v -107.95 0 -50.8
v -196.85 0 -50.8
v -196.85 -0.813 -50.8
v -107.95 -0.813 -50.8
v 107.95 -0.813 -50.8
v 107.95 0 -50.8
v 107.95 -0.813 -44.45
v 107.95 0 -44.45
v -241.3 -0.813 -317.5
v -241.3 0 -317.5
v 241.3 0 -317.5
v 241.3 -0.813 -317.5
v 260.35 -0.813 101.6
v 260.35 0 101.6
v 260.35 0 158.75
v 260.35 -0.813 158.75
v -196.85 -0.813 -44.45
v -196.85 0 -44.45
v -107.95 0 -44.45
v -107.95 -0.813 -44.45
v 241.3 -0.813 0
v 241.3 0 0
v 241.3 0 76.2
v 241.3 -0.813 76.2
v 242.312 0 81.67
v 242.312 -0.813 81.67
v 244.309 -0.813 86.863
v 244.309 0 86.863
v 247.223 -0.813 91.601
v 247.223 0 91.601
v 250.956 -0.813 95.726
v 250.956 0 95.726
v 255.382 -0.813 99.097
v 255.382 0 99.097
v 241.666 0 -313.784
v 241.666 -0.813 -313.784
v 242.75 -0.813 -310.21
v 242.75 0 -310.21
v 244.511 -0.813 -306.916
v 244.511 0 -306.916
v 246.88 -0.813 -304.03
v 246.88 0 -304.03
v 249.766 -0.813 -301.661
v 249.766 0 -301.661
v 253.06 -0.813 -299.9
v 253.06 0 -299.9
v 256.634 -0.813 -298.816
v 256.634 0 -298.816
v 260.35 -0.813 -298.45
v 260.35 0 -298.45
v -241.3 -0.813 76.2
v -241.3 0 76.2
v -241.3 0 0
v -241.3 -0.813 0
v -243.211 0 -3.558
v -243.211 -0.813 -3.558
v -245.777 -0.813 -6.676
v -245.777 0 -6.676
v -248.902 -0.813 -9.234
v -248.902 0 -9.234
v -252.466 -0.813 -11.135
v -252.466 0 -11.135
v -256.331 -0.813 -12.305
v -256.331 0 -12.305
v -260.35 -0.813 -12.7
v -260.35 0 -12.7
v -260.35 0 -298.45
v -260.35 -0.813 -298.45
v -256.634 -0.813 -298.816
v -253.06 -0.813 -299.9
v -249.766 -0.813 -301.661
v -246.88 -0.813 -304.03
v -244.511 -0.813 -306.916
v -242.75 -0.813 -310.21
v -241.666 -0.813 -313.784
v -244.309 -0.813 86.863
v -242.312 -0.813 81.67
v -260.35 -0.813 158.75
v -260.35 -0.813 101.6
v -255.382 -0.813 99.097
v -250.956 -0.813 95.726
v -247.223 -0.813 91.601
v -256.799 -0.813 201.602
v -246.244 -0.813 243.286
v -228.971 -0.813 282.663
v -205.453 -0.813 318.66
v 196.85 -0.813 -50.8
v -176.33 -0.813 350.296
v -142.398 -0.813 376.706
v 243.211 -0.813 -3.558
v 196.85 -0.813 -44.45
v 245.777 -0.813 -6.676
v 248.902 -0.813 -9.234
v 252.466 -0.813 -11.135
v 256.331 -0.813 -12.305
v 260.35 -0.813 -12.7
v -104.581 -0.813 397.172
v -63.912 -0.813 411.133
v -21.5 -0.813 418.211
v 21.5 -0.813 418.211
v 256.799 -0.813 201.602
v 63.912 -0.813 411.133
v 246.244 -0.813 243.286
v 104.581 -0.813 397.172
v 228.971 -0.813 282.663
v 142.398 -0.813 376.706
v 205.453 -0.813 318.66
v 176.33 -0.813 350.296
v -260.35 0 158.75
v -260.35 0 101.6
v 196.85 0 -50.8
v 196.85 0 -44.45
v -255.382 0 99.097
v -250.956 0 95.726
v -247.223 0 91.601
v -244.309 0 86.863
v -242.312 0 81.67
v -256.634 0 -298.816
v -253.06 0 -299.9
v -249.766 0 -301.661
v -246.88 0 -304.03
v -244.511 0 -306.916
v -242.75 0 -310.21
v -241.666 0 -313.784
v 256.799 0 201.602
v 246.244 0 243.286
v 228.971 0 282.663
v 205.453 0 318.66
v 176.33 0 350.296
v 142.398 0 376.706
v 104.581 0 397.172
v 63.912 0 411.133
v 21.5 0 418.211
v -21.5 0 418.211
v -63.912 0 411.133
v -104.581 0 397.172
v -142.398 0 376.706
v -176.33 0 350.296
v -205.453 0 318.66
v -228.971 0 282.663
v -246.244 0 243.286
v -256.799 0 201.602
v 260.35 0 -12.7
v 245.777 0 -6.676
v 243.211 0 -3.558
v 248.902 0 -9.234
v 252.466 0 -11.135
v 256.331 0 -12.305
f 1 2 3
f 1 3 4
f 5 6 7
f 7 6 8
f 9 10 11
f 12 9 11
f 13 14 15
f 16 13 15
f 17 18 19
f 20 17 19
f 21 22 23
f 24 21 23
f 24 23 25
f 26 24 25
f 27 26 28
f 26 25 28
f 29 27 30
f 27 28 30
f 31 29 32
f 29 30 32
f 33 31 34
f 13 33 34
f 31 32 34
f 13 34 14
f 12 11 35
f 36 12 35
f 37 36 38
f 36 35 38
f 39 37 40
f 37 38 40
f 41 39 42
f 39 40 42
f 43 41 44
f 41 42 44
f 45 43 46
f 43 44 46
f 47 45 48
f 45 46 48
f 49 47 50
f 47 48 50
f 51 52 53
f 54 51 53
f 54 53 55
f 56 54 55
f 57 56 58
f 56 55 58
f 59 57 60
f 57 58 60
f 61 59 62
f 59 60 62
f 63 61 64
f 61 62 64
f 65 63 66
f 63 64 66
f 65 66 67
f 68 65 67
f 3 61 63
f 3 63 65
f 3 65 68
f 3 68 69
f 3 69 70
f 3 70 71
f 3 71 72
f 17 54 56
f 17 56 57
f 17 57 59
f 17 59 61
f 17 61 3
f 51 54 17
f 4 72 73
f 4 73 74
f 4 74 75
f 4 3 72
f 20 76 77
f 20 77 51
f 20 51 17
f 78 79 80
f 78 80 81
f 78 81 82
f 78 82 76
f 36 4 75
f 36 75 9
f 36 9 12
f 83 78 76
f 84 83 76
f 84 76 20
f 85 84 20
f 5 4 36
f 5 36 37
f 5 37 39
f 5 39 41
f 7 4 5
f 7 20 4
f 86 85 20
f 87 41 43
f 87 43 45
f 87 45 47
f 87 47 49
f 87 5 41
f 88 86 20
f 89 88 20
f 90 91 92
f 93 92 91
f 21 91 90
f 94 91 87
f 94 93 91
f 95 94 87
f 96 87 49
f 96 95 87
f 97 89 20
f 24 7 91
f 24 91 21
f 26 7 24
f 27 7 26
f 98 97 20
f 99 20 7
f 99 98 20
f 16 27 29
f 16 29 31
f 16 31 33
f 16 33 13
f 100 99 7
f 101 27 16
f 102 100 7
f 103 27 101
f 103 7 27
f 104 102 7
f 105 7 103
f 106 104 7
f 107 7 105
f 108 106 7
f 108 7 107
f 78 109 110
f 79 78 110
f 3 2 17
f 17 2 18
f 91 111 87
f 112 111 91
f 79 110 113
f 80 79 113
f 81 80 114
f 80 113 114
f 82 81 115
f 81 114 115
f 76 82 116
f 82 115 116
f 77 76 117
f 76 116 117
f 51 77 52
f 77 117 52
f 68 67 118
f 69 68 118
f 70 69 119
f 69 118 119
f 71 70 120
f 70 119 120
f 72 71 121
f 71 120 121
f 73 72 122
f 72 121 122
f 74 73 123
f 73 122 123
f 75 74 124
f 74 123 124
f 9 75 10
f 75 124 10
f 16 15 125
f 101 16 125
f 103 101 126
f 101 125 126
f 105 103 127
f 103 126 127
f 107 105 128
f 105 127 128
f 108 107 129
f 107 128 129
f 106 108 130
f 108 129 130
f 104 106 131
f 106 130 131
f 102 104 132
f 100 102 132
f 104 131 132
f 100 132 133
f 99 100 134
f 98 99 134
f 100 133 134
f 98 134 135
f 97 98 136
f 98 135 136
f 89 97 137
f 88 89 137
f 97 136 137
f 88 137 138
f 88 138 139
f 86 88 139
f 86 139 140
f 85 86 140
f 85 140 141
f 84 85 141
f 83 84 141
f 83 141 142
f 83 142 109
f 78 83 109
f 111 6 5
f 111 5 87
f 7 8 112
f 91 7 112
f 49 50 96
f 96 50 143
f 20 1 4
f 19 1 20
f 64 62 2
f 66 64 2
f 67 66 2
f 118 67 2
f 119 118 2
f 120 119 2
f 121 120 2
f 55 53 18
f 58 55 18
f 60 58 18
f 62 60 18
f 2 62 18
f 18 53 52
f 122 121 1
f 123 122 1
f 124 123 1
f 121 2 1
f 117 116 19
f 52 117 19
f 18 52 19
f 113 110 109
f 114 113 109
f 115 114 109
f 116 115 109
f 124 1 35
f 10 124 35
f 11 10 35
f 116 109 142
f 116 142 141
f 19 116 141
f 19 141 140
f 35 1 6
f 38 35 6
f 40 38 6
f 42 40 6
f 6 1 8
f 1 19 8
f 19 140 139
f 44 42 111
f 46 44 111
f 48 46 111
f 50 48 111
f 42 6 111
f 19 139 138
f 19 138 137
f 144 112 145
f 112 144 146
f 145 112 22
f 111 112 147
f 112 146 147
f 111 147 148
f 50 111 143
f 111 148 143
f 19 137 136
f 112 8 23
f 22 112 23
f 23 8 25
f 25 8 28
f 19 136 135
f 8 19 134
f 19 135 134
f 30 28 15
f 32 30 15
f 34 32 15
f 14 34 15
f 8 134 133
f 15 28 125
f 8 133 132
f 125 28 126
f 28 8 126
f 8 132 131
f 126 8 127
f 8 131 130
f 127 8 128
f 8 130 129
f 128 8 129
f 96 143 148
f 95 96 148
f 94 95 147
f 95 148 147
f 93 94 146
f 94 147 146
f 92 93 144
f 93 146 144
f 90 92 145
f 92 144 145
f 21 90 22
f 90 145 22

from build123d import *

# Parameters (mm, degrees)
F0_W     = 88.9
F0_H     = 6.35
F1_DEPTH = 0.8128


with BuildPart() as f1:
    # F0 (on Front) → F1 (new body)
    with BuildSketch(Plane.XZ):
        with BuildLine():
            ThreePointArc((-241.3, 0), (-248.902375, -9.233938), (-260.35, -12.7))
            Line((-260.35, -12.7), (-260.35, -298.45))
            ThreePointArc((-260.35, -298.45), (-246.879616, -304.029616), (-241.3, -317.5))
            Line((-241.3, -317.5), (241.3, -317.5))
            ThreePointArc((241.3, -317.5), (246.879616, -304.029616), (260.35, -298.45))
            Line((260.35, -298.45), (260.35, -12.7))
            ThreePointArc((260.35, -12.7), (248.902375, -9.233938), (241.3, 0))
            Line((241.3, 0), (241.3, 76.2))
            ThreePointArc((241.3, 76.2), (247.223093, 91.60143), (260.35, 101.6))
            Line((260.35, 101.6), (260.35, 158.75))
            ThreePointArc((260.35, 158.75), (0, 419.1), (-260.35, 158.75))
            Line((-260.35, 158.75), (-260.35, 101.6))
            ThreePointArc((-260.35, 101.6), (-247.223093, 91.60143), (-241.3, 76.2))
            Line((-241.3, 76.2), (-241.3, 0))
        make_face()
        with Locations((-152.4, -47.625)):
            Rectangle(F0_W, F0_H, mode=Mode.SUBTRACT)
        with Locations((152.4, -47.625)):
            Rectangle(F0_W, F0_H, mode=Mode.SUBTRACT)
    extrude(amount=F1_DEPTH)


solid = f1.part
